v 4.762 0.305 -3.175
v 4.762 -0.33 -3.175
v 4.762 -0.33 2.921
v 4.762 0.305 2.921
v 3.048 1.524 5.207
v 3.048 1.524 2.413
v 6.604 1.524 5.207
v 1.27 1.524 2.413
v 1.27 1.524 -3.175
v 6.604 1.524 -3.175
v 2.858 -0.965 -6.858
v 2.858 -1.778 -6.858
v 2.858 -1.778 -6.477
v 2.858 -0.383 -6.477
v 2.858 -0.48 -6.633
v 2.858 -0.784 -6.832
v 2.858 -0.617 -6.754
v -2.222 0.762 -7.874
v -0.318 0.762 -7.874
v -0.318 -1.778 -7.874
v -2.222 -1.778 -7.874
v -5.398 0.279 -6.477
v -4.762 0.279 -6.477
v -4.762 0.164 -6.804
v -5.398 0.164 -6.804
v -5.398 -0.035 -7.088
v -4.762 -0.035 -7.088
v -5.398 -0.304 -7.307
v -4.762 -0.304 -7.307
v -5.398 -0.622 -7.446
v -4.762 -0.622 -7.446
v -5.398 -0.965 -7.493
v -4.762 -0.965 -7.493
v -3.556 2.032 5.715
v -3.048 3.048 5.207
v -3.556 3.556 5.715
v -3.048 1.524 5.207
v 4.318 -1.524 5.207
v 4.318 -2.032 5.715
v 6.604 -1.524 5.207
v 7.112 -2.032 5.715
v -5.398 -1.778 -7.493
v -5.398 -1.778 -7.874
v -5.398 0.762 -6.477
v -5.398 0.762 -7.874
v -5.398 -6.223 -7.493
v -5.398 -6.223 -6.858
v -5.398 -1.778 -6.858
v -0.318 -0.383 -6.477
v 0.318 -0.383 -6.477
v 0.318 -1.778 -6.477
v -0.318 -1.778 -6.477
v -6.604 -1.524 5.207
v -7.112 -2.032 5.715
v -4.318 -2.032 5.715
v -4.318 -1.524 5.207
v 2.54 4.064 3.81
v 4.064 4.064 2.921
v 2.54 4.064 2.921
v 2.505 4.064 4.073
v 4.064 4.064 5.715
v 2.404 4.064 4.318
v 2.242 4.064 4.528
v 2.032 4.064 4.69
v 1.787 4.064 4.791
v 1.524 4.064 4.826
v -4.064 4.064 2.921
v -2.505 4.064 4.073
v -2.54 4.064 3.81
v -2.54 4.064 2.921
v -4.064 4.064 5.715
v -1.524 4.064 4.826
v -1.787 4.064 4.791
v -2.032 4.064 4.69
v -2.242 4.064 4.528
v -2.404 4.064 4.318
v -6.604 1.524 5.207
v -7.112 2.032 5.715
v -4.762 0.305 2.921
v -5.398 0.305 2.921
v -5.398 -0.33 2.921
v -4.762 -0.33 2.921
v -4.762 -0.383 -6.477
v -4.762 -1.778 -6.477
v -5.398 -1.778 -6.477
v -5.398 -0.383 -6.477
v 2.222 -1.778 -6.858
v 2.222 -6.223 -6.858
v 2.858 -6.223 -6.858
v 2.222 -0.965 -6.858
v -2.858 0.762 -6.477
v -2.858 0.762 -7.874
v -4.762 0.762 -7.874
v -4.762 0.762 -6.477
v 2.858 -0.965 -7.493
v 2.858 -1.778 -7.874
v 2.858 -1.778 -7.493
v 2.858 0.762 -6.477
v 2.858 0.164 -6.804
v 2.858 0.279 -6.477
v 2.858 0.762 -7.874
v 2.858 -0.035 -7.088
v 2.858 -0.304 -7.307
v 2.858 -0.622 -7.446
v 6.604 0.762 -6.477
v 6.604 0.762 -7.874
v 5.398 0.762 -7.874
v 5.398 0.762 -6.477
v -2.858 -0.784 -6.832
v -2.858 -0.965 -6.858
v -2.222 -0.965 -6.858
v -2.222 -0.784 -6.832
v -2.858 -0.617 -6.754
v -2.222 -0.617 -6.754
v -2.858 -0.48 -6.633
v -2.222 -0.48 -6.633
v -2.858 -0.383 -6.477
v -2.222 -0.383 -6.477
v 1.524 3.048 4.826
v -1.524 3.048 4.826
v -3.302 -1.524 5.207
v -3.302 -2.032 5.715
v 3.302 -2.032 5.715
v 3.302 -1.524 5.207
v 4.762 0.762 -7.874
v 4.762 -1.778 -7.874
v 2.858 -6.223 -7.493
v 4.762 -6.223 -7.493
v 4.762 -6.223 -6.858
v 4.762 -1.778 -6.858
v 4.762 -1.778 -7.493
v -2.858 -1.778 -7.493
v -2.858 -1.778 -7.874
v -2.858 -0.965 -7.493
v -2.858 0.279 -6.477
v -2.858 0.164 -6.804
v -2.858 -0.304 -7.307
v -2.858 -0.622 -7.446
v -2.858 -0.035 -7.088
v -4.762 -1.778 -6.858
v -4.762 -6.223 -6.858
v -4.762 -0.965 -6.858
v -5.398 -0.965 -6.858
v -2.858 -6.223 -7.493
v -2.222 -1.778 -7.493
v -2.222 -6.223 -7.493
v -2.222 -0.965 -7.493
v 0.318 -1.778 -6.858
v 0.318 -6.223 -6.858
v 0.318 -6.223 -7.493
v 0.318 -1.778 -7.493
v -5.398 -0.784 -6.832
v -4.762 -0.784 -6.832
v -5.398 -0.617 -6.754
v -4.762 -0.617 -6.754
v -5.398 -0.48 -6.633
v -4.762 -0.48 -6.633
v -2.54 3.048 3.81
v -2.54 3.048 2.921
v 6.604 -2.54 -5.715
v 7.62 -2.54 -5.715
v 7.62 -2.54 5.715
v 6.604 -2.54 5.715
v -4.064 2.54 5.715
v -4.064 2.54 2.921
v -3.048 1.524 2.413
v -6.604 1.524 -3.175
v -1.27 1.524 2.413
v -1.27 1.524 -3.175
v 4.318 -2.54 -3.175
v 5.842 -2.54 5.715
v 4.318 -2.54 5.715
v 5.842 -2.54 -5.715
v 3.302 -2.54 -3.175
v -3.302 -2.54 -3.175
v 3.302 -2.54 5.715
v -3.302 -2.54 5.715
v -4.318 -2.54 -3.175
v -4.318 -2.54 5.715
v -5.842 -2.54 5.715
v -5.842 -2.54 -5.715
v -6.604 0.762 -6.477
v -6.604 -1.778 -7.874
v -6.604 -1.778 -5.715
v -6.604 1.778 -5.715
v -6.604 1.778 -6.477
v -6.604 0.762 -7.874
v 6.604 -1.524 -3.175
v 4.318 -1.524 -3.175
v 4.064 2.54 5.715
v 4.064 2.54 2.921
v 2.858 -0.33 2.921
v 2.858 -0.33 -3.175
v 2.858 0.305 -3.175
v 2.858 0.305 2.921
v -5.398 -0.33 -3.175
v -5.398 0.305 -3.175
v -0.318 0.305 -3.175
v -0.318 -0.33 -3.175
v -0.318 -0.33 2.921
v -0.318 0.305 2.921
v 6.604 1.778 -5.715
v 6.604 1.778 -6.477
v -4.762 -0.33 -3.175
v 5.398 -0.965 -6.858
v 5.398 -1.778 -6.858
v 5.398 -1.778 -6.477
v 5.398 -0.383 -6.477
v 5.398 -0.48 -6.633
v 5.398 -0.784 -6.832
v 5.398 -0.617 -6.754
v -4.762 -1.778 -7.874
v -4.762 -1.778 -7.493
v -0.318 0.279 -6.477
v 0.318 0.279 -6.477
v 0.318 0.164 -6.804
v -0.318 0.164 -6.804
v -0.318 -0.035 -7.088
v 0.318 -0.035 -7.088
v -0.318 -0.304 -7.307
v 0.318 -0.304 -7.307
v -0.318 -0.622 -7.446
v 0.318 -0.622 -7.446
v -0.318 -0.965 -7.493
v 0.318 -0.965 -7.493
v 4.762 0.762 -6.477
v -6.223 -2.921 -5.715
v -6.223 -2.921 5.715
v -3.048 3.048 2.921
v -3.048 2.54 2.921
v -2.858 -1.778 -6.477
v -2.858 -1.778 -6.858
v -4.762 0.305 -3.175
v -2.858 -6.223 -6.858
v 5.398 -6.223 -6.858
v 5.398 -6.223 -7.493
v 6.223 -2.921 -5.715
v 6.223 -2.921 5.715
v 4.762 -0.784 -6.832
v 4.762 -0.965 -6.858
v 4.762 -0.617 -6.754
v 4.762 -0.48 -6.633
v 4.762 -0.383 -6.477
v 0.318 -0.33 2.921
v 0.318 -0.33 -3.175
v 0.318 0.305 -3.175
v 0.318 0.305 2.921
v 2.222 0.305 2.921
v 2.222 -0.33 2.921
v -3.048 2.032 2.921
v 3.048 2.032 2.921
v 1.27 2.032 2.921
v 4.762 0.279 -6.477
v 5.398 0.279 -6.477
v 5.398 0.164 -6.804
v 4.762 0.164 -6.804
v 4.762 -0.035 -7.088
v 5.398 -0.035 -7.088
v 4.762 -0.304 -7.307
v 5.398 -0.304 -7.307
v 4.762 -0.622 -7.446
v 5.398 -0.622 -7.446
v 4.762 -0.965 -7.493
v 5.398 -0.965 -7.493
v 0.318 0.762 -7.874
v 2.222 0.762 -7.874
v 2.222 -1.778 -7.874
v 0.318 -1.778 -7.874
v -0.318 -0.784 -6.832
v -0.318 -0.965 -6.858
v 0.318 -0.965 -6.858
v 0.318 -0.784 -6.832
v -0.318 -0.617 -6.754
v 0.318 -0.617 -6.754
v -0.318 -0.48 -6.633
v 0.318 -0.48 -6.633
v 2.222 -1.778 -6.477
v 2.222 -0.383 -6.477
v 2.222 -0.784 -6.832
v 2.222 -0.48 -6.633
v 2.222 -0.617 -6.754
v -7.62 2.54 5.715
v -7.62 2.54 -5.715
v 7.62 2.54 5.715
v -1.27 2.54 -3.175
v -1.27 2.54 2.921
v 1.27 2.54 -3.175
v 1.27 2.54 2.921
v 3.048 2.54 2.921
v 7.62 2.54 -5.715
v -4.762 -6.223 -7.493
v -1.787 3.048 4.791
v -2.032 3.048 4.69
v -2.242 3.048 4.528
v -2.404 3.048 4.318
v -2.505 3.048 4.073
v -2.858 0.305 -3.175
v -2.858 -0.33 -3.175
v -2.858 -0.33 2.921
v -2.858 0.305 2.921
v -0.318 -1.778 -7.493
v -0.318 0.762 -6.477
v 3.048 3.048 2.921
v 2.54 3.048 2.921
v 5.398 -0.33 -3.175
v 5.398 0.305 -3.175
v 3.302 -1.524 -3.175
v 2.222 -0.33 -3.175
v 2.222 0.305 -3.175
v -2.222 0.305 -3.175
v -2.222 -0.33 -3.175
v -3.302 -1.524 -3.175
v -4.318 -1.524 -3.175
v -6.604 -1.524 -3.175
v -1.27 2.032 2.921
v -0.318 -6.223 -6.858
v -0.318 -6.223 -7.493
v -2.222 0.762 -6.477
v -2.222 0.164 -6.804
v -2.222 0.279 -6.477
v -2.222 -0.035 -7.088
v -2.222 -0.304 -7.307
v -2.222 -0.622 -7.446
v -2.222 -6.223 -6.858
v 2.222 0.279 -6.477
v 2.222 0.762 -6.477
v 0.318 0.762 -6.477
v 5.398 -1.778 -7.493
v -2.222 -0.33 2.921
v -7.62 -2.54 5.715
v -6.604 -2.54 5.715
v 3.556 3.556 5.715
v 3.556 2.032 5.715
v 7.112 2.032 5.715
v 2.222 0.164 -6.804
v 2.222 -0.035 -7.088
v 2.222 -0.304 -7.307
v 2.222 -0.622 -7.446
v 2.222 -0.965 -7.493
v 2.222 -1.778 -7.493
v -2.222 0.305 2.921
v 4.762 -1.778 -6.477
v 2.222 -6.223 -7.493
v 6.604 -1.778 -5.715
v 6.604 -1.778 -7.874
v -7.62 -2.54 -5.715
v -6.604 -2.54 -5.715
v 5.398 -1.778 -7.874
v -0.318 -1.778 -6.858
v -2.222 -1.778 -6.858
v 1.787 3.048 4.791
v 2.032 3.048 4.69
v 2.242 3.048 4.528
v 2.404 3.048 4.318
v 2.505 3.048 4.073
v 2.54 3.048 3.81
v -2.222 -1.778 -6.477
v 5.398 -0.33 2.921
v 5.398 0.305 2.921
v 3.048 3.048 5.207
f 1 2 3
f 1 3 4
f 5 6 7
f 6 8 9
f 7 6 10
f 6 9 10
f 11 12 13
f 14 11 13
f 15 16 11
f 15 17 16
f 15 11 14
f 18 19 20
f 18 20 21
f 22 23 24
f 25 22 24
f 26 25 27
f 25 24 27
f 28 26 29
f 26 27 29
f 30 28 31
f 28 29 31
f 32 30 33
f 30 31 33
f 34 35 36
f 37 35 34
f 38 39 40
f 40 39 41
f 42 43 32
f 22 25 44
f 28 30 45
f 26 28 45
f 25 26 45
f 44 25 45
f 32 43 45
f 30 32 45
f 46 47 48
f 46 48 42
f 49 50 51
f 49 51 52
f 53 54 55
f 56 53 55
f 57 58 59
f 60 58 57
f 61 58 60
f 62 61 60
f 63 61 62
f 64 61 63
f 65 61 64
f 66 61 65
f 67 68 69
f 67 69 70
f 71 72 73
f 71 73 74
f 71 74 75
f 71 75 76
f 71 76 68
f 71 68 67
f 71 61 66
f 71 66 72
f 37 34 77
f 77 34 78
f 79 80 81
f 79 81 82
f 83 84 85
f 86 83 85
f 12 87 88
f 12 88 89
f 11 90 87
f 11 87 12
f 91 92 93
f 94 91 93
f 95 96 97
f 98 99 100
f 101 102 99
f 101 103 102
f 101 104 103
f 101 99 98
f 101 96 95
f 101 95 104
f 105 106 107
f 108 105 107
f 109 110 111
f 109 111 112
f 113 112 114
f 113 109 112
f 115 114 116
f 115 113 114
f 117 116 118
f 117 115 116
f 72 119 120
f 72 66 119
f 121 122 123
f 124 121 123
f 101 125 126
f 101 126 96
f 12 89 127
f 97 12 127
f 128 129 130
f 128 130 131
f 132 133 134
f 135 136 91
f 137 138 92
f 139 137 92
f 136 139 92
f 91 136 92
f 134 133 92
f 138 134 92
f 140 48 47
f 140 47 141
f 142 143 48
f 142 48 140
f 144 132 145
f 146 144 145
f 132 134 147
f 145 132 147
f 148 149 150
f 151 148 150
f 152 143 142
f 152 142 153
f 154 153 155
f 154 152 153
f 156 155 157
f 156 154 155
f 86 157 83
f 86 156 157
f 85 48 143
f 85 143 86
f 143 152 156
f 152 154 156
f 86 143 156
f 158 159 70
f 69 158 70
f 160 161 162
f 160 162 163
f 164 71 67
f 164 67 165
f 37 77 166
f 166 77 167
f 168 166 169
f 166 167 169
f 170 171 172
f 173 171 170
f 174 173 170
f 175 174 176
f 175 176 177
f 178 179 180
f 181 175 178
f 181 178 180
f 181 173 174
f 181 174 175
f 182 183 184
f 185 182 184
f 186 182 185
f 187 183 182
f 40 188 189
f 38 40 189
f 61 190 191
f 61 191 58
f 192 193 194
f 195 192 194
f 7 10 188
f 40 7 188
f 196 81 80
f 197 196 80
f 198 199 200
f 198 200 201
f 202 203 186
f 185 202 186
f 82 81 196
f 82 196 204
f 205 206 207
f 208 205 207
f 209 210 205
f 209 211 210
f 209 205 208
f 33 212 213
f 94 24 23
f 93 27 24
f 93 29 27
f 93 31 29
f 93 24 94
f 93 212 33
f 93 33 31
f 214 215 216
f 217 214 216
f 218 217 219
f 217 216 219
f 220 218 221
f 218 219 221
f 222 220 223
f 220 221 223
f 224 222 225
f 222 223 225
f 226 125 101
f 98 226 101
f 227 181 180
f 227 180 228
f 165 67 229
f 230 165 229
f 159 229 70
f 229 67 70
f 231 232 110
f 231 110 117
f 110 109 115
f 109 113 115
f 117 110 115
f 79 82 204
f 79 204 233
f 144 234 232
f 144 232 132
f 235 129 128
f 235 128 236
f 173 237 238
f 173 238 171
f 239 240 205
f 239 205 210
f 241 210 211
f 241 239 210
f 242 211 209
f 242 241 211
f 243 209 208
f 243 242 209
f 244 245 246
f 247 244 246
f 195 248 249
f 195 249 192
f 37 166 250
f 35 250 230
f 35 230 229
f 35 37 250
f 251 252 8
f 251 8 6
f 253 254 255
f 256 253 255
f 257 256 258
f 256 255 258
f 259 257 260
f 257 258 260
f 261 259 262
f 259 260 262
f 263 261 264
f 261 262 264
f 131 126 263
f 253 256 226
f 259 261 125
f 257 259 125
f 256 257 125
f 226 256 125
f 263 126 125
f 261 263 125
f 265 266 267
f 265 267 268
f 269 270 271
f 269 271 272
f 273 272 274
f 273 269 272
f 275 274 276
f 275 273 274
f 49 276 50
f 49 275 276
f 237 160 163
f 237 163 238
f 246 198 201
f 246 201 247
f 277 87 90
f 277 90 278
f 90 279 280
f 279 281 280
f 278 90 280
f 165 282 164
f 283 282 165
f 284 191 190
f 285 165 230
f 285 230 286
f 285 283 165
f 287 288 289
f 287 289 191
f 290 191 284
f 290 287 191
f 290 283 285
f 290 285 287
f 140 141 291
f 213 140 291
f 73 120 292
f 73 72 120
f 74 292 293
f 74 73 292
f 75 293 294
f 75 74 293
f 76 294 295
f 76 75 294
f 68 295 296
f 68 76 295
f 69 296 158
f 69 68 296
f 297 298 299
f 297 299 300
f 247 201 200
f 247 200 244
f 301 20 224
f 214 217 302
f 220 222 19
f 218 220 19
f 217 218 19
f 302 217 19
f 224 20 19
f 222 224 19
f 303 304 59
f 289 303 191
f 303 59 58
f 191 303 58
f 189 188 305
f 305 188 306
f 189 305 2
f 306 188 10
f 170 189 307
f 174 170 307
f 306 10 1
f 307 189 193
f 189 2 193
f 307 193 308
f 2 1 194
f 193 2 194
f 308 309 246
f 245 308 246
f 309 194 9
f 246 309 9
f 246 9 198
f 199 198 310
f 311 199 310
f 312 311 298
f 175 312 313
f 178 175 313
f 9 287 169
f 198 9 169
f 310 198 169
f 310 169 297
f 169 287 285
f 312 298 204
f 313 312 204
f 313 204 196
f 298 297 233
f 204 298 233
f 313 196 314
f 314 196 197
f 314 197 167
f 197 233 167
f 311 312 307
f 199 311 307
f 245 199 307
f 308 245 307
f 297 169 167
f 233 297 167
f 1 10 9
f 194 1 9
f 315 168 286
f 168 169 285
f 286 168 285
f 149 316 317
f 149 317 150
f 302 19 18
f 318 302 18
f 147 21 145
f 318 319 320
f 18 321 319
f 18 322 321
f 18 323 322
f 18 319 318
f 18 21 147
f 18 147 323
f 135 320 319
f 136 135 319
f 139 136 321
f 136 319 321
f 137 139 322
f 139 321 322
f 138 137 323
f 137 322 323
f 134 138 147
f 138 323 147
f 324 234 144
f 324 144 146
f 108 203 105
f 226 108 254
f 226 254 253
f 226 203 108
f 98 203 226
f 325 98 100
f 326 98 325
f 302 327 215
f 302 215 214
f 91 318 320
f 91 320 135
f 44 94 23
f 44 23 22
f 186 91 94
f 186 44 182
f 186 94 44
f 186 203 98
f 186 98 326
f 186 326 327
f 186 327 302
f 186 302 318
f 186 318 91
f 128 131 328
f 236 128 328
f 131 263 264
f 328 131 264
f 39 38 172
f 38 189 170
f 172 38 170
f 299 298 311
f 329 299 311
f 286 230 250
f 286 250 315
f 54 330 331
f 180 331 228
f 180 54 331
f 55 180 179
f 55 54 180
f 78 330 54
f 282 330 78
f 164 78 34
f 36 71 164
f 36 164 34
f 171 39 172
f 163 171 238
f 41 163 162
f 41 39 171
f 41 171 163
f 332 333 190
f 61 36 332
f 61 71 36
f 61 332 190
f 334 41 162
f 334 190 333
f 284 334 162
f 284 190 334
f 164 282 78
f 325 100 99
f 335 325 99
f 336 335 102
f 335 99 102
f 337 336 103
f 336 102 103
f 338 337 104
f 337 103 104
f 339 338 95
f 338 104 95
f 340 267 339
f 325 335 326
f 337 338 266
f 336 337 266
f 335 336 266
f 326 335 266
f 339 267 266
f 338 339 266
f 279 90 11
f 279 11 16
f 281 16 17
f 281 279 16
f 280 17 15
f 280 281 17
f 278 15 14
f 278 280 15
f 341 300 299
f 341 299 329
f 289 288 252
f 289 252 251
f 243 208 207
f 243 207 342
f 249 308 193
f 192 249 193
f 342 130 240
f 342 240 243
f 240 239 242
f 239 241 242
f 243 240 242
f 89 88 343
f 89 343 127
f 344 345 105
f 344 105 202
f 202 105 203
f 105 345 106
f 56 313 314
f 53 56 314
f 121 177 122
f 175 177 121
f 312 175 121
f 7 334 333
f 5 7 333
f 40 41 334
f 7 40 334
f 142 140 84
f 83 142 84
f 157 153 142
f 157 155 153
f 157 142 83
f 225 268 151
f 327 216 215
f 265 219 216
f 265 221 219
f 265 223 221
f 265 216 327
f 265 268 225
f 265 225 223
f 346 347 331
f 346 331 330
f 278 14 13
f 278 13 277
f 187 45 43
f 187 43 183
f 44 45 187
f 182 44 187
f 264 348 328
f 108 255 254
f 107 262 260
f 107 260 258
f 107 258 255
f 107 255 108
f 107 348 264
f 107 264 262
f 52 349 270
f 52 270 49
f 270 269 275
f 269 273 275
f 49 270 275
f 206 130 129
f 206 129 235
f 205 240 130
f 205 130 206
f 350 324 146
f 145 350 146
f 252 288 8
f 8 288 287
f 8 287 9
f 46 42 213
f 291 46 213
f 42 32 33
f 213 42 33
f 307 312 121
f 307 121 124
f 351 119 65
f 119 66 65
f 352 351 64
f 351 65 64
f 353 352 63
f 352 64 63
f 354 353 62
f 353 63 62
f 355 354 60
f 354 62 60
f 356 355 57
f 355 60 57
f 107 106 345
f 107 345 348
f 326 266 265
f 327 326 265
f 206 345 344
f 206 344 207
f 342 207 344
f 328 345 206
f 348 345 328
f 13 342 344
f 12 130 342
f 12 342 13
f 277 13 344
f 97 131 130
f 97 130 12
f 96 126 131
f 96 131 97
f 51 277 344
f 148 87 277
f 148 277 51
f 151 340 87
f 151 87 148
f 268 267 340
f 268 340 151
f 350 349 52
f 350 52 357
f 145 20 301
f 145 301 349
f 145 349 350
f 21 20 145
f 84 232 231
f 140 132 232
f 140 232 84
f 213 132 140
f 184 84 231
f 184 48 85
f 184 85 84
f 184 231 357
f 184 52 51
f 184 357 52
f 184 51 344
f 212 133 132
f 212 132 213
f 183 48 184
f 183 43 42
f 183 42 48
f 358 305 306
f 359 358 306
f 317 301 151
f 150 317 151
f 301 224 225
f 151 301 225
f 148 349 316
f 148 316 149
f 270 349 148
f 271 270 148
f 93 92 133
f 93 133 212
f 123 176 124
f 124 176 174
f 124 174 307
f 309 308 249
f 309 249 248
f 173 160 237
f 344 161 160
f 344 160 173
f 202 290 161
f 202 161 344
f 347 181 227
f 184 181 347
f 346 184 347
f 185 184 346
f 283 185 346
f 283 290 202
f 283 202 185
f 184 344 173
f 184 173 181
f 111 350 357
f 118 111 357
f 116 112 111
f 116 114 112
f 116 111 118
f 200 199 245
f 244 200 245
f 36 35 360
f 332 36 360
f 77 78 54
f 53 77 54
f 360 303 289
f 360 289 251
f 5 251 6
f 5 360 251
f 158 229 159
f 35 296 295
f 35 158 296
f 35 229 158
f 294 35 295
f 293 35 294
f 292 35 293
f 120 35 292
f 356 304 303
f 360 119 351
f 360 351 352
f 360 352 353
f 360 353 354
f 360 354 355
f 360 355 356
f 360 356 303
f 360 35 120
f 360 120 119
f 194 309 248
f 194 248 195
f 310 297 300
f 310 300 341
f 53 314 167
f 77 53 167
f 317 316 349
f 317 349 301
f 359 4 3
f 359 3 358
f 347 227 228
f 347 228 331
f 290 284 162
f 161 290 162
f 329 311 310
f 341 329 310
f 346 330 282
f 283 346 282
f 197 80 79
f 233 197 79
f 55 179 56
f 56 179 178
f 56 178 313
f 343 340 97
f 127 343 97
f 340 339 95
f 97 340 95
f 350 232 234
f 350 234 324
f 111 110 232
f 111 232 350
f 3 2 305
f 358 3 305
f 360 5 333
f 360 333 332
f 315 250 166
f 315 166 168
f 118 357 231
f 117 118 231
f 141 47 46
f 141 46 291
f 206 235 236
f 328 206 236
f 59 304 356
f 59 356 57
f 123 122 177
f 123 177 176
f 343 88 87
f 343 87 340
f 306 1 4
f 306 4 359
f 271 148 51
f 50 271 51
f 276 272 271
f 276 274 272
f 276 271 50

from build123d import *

# Parameters (mm, degrees)
SKETCH1_W            = 13.208
SKETCH1_H            = 3.556
BOSS_EXTRUDE1_DEPTH  = 0.762
SKETCH2_W            = 0.635
SKETCH2_H            = 0.662353677
BOSS_EXTRUDE2_DEPTH  = 1.016
SKETCH3_W            = 0.635
SKETCH3_H            = 0.662353677
BOSS_EXTRUDE3_DEPTH  = 1.016
SKETCH4_W            = 0.635
SKETCH4_H            = 0.662353677
BOSS_EXTRUDE4_DEPTH  = 1.016
SKETCH5_W            = 0.635
SKETCH5_H            = 0.662353677
BOSS_EXTRUDE5_DEPTH  = 1.016
SKETCH6_W            = 0.635
SKETCH6_H            = 0.662353677
BOSS_EXTRUDE6_DEPTH  = 1.016
SKETCH7_W            = 0.635
SKETCH7_H            = 0.635
BOSS_EXTRUDE7_DEPTH  = 5.839787113
SKETCH8_W            = 0.635
SKETCH8_H            = 0.635
BOSS_EXTRUDE8_DEPTH  = 5.839787113
SKETCH9_W            = 0.635
SKETCH9_H            = 0.635
BOSS_EXTRUDE9_DEPTH  = 5.839787113
SKETCH10_W           = 0.635
SKETCH10_H           = 0.635
BOSS_EXTRUDE10_DEPTH = 5.839787113
SKETCH11_W           = 0.635
SKETCH11_H           = 0.635
BOSS_EXTRUDE11_DEPTH = 5.839787113
BOSS_EXTRUDE12_DEPTH = 11.43
CUT_EXTRUDE1_REACH   = 15.26
SKETCH14_W           = 1.778
SKETCH14_H           = 1.016
CUT_EXTRUDE2_DEPTH   = 2.793999999
SKETCH15_W           = 1.778
SKETCH15_H           = 1.016
CUT_EXTRUDE3_DEPTH   = 2.794
BOSS_EXTRUDE13_DEPTH = 2.794
SKETCH17_W           = 6.604
SKETCH17_H           = 1.016
BOSS_EXTRUDE14_DEPTH = 8.89
SKETCH18_W           = 5.08
SKETCH18_H           = 1.016
CUT_EXTRUDE4_DEPTH   = 1.905
CHAMFER1_SIZE        = 0.508
CHAMFER2_SIZE        = 0.508
CHAMFER3_SIZE        = 0.508
DRAFT1_ANGLE         = 45
CHAMFER4_SIZE        = 0.508
SKETCH19_W           = 0.635
SKETCH19_H           = 0.635
BOSS_EXTRUDE15_DEPTH = 6.096
SKETCH20_W           = 0.635
SKETCH20_H           = 0.635
BOSS_EXTRUDE16_DEPTH = 6.096
SKETCH21_W           = 0.635
SKETCH21_H           = 0.635
BOSS_EXTRUDE17_DEPTH = 6.096
SKETCH22_W           = 0.635
SKETCH22_H           = 0.635
BOSS_EXTRUDE18_DEPTH = 6.096
SKETCH23_W           = 0.635
SKETCH23_H           = 0.635
BOSS_EXTRUDE19_DEPTH = 6.096
FILLET1_R            = 0.635
FILLET2_R            = 0.635
FILLET3_R            = 0.635
FILLET4_R            = 0.635
FILLET5_R            = 0.635
FILLET6_R            = 1.27
FILLET7_R            = 1.27
FILLET8_R            = 1.27
FILLET9_R            = 1.27
FILLET10_R           = 1.27
SKETCH24_W           = 1.905
SKETCH24_H           = 2.54
BOSS_EXTRUDE20_DEPTH = 1.397
SKETCH25_W           = 1.905
SKETCH25_H           = 2.54
BOSS_EXTRUDE21_DEPTH = 1.397
SKETCH26_W           = 1.905
SKETCH26_H           = 2.54
BOSS_EXTRUDE22_DEPTH = 1.397
SKETCH27_W           = 1.2065
SKETCH27_H           = 2.54
BOSS_EXTRUDE23_DEPTH = 1.397
SKETCH28_W           = 1.905
SKETCH28_H           = 2.54
BOSS_EXTRUDE24_DEPTH = 1.397
SKETCH29_W           = 1.2065
SKETCH29_H           = 2.54
BOSS_EXTRUDE25_DEPTH = 1.397
FILLET11_R           = 1.016
FILLET12_R           = 1.016


with BuildPart() as part:
    # Sketch1 → Boss-Extrude1 (new body)
    with BuildSketch(Plane(origin=(0, 0, -6.477), x_dir=(-1, 0, 0), z_dir=(0, 0, -1))):
        Rectangle(SKETCH1_W, SKETCH1_H)
    extrude(amount=-BOSS_EXTRUDE1_DEPTH)

    # Sketch2 → Boss-Extrude2 (add)
    with BuildSketch(Plane(origin=(0, 0, -6.477), x_dir=(-1, 0, 0), z_dir=(0, 0, -1))):
        with Locations((5.08, -0.052036048)):
            Rectangle(SKETCH2_W, SKETCH2_H)
    extrude(amount=BOSS_EXTRUDE2_DEPTH)

    # Sketch3 → Boss-Extrude3 (add)
    with BuildSketch(Plane(origin=(0, 0, -6.477), x_dir=(-1, 0, 0), z_dir=(0, 0, -1))):
        with Locations((2.54, -0.052036048)):
            Rectangle(SKETCH3_W, SKETCH3_H)
    extrude(amount=BOSS_EXTRUDE3_DEPTH)

    # Sketch4 → Boss-Extrude4 (add)
    with BuildSketch(Plane(origin=(0, 0, -6.477), x_dir=(-1, 0, 0), z_dir=(0, 0, -1))):
        with Locations((0, -0.052036048)):
            Rectangle(SKETCH4_W, SKETCH4_H)
    extrude(amount=BOSS_EXTRUDE4_DEPTH)

    # Sketch5 → Boss-Extrude5 (add)
    with BuildSketch(Plane(origin=(0, 0, -6.477), x_dir=(-1, 0, 0), z_dir=(0, 0, -1))):
        with Locations((-2.54, -0.052036048)):
            Rectangle(SKETCH5_W, SKETCH5_H)
    extrude(amount=BOSS_EXTRUDE5_DEPTH)

    # Sketch6 → Boss-Extrude6 (add)
    with BuildSketch(Plane(origin=(0, 0, -6.477), x_dir=(-1, 0, 0), z_dir=(0, 0, -1))):
        with Locations((-5.08, -0.052036048)):
            Rectangle(SKETCH6_W, SKETCH6_H)
    extrude(amount=BOSS_EXTRUDE6_DEPTH)

    # Sketch7 → Boss-Extrude7 (add)
    with BuildSketch(Plane.XZ.offset(0.383212887)):
        with Locations((5.08, -7.1755)):
            Rectangle(SKETCH7_W, SKETCH7_H)
    extrude(amount=BOSS_EXTRUDE7_DEPTH)

    # Sketch8 → Boss-Extrude8 (add)
    with BuildSketch(Plane.XZ.offset(0.383212887)):
        with Locations((2.54, -7.1755)):
            Rectangle(SKETCH8_W, SKETCH8_H)
    extrude(amount=BOSS_EXTRUDE8_DEPTH)

    # Sketch9 → Boss-Extrude9 (add)
    with BuildSketch(Plane.XZ.offset(0.383212887)):
        with Locations((0, -7.1755)):
            Rectangle(SKETCH9_W, SKETCH9_H)
    extrude(amount=BOSS_EXTRUDE9_DEPTH)

    # Sketch10 → Boss-Extrude10 (add)
    with BuildSketch(Plane.XZ.offset(0.383212887)):
        with Locations((-2.54, -7.1755)):
            Rectangle(SKETCH10_W, SKETCH10_H)
    extrude(amount=BOSS_EXTRUDE10_DEPTH)

    # Sketch11 → Boss-Extrude11 (add)
    with BuildSketch(Plane.XZ.offset(0.383212887)):
        with Locations((-5.08, -7.1755)):
            Rectangle(SKETCH11_W, SKETCH11_H)
    extrude(amount=BOSS_EXTRUDE11_DEPTH)

    # Sketch12 → Boss-Extrude12 (add)
    with BuildSketch(Plane(origin=(0, 0, -5.715), x_dir=(-1, 0, 0), z_dir=(0, 0, -1))):
        Polygon((7.62, 2.54), (-7.62, 2.54), (-7.62, -2.54), (-6.604, -2.54), (-5.842, -3.302), (-5.842, -2.54), (5.842, -2.54), (5.842, -3.302), (6.604, -2.54), (7.62, -2.54), align=None)
    extrude(amount=-BOSS_EXTRUDE12_DEPTH)

    # Sketch13 → Cut-Extrude1 (cut, up to next)
    with BuildSketch(Plane(origin=(0, 0, -3.175), x_dir=(-1, 0, 0), z_dir=(0, 0, -1)), mode=Mode.PRIVATE) as cut_extrude1_sk1:
        Polygon((-4.318, -2.54), (4.318, -2.54), (4.318, -1.524), (6.604, -1.524), (6.604, 1.524), (1.27, 1.524), (1.27, 2.54), (-1.27, 2.54), (-1.27, 1.524), (-6.604, 1.524), (-6.604, -1.524), (-4.318, -1.524), align=None)
    cut_extrude1_tool1 = extrude(cut_extrude1_sk1.sketch, amount=-CUT_EXTRUDE1_REACH, mode=Mode.PRIVATE) & part.part
    add(cut_extrude1_tool1.solids().sort_by_distance((0, -0.24384, -3.175))[0], mode=Mode.SUBTRACT)

    # Sketch14 → Cut-Extrude2 (cut)
    with BuildSketch(Plane.XY.offset(5.715)):
        with Locations((2.159, 2.032)):
            Rectangle(SKETCH14_W, SKETCH14_H)
    extrude(amount=-CUT_EXTRUDE2_DEPTH, mode=Mode.SUBTRACT)

    # Sketch15 → Cut-Extrude3 (cut)
    with BuildSketch(Plane.XY.offset(5.715)):
        with Locations((-2.159, 2.032)):
            Rectangle(SKETCH15_W, SKETCH15_H)
    extrude(amount=-CUT_EXTRUDE3_DEPTH, mode=Mode.SUBTRACT)

    # Sketch16 → Boss-Extrude13 (add)
    with BuildSketch(Plane.XY.offset(5.715)):
        Polygon((-3.048, 3.048), (3.048, 3.048), (3.048, 2.54), (4.064, 2.54), (4.064, 4.064), (-4.064, 4.064), (-4.064, 2.54), (-3.048, 2.54), align=None)
    extrude(amount=-BOSS_EXTRUDE13_DEPTH)

    # Sketch17 → Boss-Extrude14 (add)
    with BuildSketch(Plane.XY.offset(-3.175)):
        with Locations((0, -2.032)):
            Rectangle(SKETCH17_W, SKETCH17_H)
    extrude(amount=BOSS_EXTRUDE14_DEPTH)

    # Sketch18 → Cut-Extrude4 (cut)
    with BuildSketch(Plane(origin=(0, 0, 2.921), x_dir=(-1, 0, 0), z_dir=(0, 0, -1))):
        with Locations((0, 3.556)):
            Rectangle(SKETCH18_W, SKETCH18_H)
    extrude(amount=-CUT_EXTRUDE4_DEPTH, mode=Mode.SUBTRACT)

    # Chamfer1
    chamfer1_edges = [part.edges().sort_by_distance(p)[0] for p in [
        (2.159, 1.524, 2.921000001),
    ]]
    chamfer(chamfer1_edges, length=CHAMFER1_SIZE)

    # Chamfer2
    chamfer2_edges = [part.edges().sort_by_distance(p)[0] for p in [
        (-2.159, 1.524, 2.921),
    ]]
    chamfer(chamfer2_edges, length=CHAMFER2_SIZE)

    # Chamfer3
    chamfer3_edges = [part.edges().sort_by_distance(p)[0] for p in [
        (0, -1.524, 5.715),
    ]]
    chamfer(chamfer3_edges, length=CHAMFER3_SIZE)

    # Draft1
    draft1_faces = [part.faces().sort_by_distance(p)[0] for p in [
        (5.842, -2.921, 0),
        (-5.842, -2.921, 0),
    ]]
    draft(draft1_faces, Plane(origin=(5.842, -2.54, 5.715), x_dir=(0, 0, -1), z_dir=(0, -1, 0)), DRAFT1_ANGLE)

    # Chamfer4
    chamfer4_edges = [part.edges().sort_by_distance(p)[0] for p in [
        (5.461, -1.524, 5.715),
        (6.604, 0, 5.715),
        (4.826, 1.524, 5.715),
        (-6.604, 0, 5.715),
        (-5.461, -1.524, 5.715),
        (3.048, 2.032, 5.715),
        (-4.826, 1.524, 5.715),
        (-3.048, 2.032, 5.715),
        (0, 3.048, 5.715),
    ]]
    chamfer(chamfer4_edges, length=CHAMFER4_SIZE)

    # Sketch19 → Boss-Extrude15 (add)
    with BuildSketch(Plane.XY.offset(-3.175)):
        with Locations((5.08, -0.0127)):
            Rectangle(SKETCH19_W, SKETCH19_H)
    extrude(amount=BOSS_EXTRUDE15_DEPTH)

    # Sketch20 → Boss-Extrude16 (add)
    with BuildSketch(Plane.XY.offset(-3.175)):
        with Locations((2.54, -0.0127)):
            Rectangle(SKETCH20_W, SKETCH20_H)
    extrude(amount=BOSS_EXTRUDE16_DEPTH)

    # Sketch21 → Boss-Extrude17 (add)
    with BuildSketch(Plane.XY.offset(-3.175)):
        with Locations((0, -0.0127)):
            Rectangle(SKETCH21_W, SKETCH21_H)
    extrude(amount=BOSS_EXTRUDE17_DEPTH)

    # Sketch22 → Boss-Extrude18 (add)
    with BuildSketch(Plane.XY.offset(-3.175)):
        with Locations((-2.54, -0.0127)):
            Rectangle(SKETCH22_W, SKETCH22_H)
    extrude(amount=BOSS_EXTRUDE18_DEPTH)

    # Sketch23 → Boss-Extrude19 (add)
    with BuildSketch(Plane.XY.offset(2.921)):
        with Locations((-5.08, -0.0127)):
            Rectangle(SKETCH23_W, SKETCH23_H)
    extrude(amount=-BOSS_EXTRUDE19_DEPTH)

    # Fillet1
    # the kernel refuses this fillet: 0.635 mm, written as the material it adds along each edge
    with BuildSketch(Plane(origin=(-5.3975, -0.383212887, -6.858), x_dir=(0, 0, 1), z_dir=(1, 0, 0))) as fillet1_piece_1:
        with BuildLine():
            CenterArc((0.635, 0.581987113), FILLET1_R, 180, 66.421821522)
            Line((0, 0.581987113), (-0.0127, 0.581987113))
            Line((-0.0127, 0.581987113), (-0.0127, 0))
            Line((-0.0127, 0), (0, -0.0127))
            ThreePointArc((0, -0.0127), (0.1905, -0.0127), (0.37592, -0.011639742))
            Line((0.37592, -0.011639742), (0.381, 0))
        make_face()
    extrude(amount=0.635)

    # Fillet2
    # the kernel refuses this fillet: 0.635 mm, written as the material it adds along each edge
    with BuildSketch(Plane(origin=(-2.8575, -0.383212887, -6.858), x_dir=(0, 0, 1), z_dir=(1, 0, 0))) as fillet2_piece_1:
        with BuildLine():
            CenterArc((0.635, 0.581987113), FILLET2_R, 180, 66.421821522)
            Line((0, 0.581987113), (-0.0127, 0.581987113))
            Line((-0.0127, 0.581987113), (-0.0127, 0))
            Line((-0.0127, 0), (0, -0.0127))
            ThreePointArc((0, -0.0127), (0.1905, -0.0127), (0.37592, -0.011639742))
            Line((0.37592, -0.011639742), (0.381, 0))
        make_face()
    extrude(amount=0.635)

    # Fillet3
    # the kernel refuses this fillet: 0.635 mm, written as the material it adds along each edge
    with BuildSketch(Plane(origin=(-0.3175, -0.383212887, -6.858), x_dir=(0, 0, 1), z_dir=(1, 0, 0))) as fillet3_piece_1:
        with BuildLine():
            CenterArc((0.635, 0.581987113), FILLET3_R, 180, 66.421821522)
            Line((0, 0.581987113), (-0.0127, 0.581987113))
            Line((-0.0127, 0.581987113), (-0.0127, 0))
            Line((-0.0127, 0), (0, -0.0127))
            ThreePointArc((0, -0.0127), (0.1905, -0.0127), (0.37592, -0.011639742))
            Line((0.37592, -0.011639742), (0.381, 0))
        make_face()
    extrude(amount=0.635)

    # Fillet4
    # the kernel refuses this fillet: 0.635 mm, written as the material it adds along each edge
    with BuildSketch(Plane(origin=(2.2225, -0.383212887, -6.858), x_dir=(0, 0, 1), z_dir=(1, 0, 0))) as fillet4_piece_1:
        with BuildLine():
            CenterArc((0.635, 0.581987113), FILLET4_R, 180, 66.421821522)
            Line((0, 0.581987113), (-0.0127, 0.581987113))
            Line((-0.0127, 0.581987113), (-0.0127, 0))
            Line((-0.0127, 0), (0, -0.0127))
            ThreePointArc((0, -0.0127), (0.1905, -0.0127), (0.37592, -0.011639742))
            Line((0.37592, -0.011639742), (0.381, 0))
        make_face()
    extrude(amount=0.635)

    # Fillet5
    # the kernel refuses this fillet: 0.635 mm, written as the material it adds along each edge
    with BuildSketch(Plane(origin=(4.7625, -0.383212887, -6.858), x_dir=(0, 0, 1), z_dir=(1, 0, 0))) as fillet5_piece_1:
        with BuildLine():
            CenterArc((0.635, 0.581987113), FILLET5_R, 180, 66.421821522)
            Line((0, 0.581987113), (-0.0127, 0.581987113))
            Line((-0.0127, 0.581987113), (-0.0127, 0))
            Line((-0.0127, 0), (0, -0.0127))
            ThreePointArc((0, -0.0127), (0.1905, -0.0127), (0.37592, -0.011639742))
            Line((0.37592, -0.011639742), (0.381, 0))
        make_face()
    extrude(amount=0.635)

    # Fillet6
    # the kernel refuses this fillet: 1.27 mm, written as the material it takes off along each edge
    with BuildSketch(Plane(origin=(-4.7625, 0.27914079, -7.493), x_dir=(0, -1.5751835531463075e-12, 1.0), z_dir=(-1, 0, 0))) as fillet6_piece_1:
        with BuildLine():
            CenterArc((1.27, -1.244340789), FILLET6_R, 101.536959033, 78.463040967)
            Line((0, -1.244340789), (0, 0))
            Line((0, 0), (1.016, 0))
        make_face()
    extrude(amount=3.745851973, mode=Mode.SUBTRACT)

    # Fillet7
    # the kernel refuses this fillet: 1.27 mm, written as the material it takes off along each edge
    with BuildSketch(Plane(origin=(-2.2225, 0.27914079, -7.493), x_dir=(0, -1.5751835531463075e-12, 1.0), z_dir=(-1, 0, 0))) as fillet7_piece_1:
        with BuildLine():
            CenterArc((1.27, -1.244340789), FILLET7_R, 101.536959033, 78.463040967)
            Line((0, -1.244340789), (0, 0))
            Line((0, 0), (1.016, 0))
        make_face()
    extrude(amount=3.745851973, mode=Mode.SUBTRACT)

    # Fillet8
    # the kernel refuses this fillet: 1.27 mm, written as the material it takes off along each edge
    with BuildSketch(Plane(origin=(0.3175, 0.27914079, -7.493), x_dir=(0, -1.5751835531463075e-12, 1.0), z_dir=(-1, 0, 0))) as fillet8_piece_1:
        with BuildLine():
            CenterArc((1.27, -1.244340789), FILLET8_R, 101.536959033, 78.463040967)
            Line((0, -1.244340789), (0, 0))
            Line((0, 0), (1.016, 0))
        make_face()
    extrude(amount=3.745851974, mode=Mode.SUBTRACT)

    # Fillet9
    # the kernel refuses this fillet: 1.27 mm, written as the material it takes off along each edge
    with BuildSketch(Plane(origin=(2.8575, 0.27914079, -7.493), x_dir=(0, -1.5751835531463075e-12, 1.0), z_dir=(-1, 0, 0))) as fillet9_piece_1:
        with BuildLine():
            CenterArc((1.27, -1.244340789), FILLET9_R, 101.536959033, 78.463040967)
            Line((0, -1.244340789), (0, 0))
            Line((0, 0), (1.016, 0))
        make_face()
    extrude(amount=3.745851973, mode=Mode.SUBTRACT)

    # Fillet10
    # the kernel refuses this fillet: 1.27 mm, written as the material it takes off along each edge
    with BuildSketch(Plane(origin=(8.508351974, 0.27914079, -7.493), x_dir=(0, -1.5751835531463075e-12, 1.0), z_dir=(-1, 0, 0))) as fillet10_piece_1:
        with BuildLine():
            CenterArc((1.27, -1.244340789), FILLET10_R, 101.536959033, 78.463040967)
            Line((0, -1.244340789), (-0.0254, -1.244340789))
            Line((-0.0254, -1.244340789), (-0.0254, 0))
            Line((-0.0254, 0), (0, 0.0254))
            ThreePointArc((0, 0.0254), (0.508, 0.0254), (1.01092, 0.024886816))
            Line((1.01092, 0.024886816), (1.016, 0))
        make_face()
    extrude(amount=6.856703947, mode=Mode.SUBTRACT)

    # Sketch24 → Boss-Extrude20 (add)
    with BuildSketch(Plane(origin=(0, 0, -7.874), x_dir=(-1, 0, 0), z_dir=(0, 0, -1))):
        with Locations((1.27, -0.508)):
            Rectangle(SKETCH24_W, SKETCH24_H)
    extrude(amount=-BOSS_EXTRUDE20_DEPTH)

    # Sketch25 → Boss-Extrude21 (add)
    with BuildSketch(Plane(origin=(0, 0, -7.874), x_dir=(-1, 0, 0), z_dir=(0, 0, -1))):
        with Locations((-1.27, -0.508)):
            Rectangle(SKETCH25_W, SKETCH25_H)
    extrude(amount=-BOSS_EXTRUDE21_DEPTH)

    # Sketch26 → Boss-Extrude22 (add)
    with BuildSketch(Plane(origin=(0, 0, -7.874), x_dir=(-1, 0, 0), z_dir=(0, 0, -1))):
        with Locations((3.81, -0.508)):
            Rectangle(SKETCH26_W, SKETCH26_H)
    extrude(amount=-BOSS_EXTRUDE22_DEPTH)

    # Sketch27 → Boss-Extrude23 (add)
    with BuildSketch(Plane(origin=(0, 0, -7.874), x_dir=(-1, 0, 0), z_dir=(0, 0, -1))):
        with Locations((6.00075, -0.508)):
            Rectangle(SKETCH27_W, SKETCH27_H)
    extrude(amount=-BOSS_EXTRUDE23_DEPTH)

    # Sketch28 → Boss-Extrude24 (add)
    with BuildSketch(Plane(origin=(0, 0, -7.874), x_dir=(-1, 0, 0), z_dir=(0, 0, -1))):
        with Locations((-3.81, -0.508)):
            Rectangle(SKETCH28_W, SKETCH28_H)
    extrude(amount=-BOSS_EXTRUDE24_DEPTH)

    # Sketch29 → Boss-Extrude25 (add)
    with BuildSketch(Plane(origin=(0, 0, -7.874), x_dir=(-1, 0, 0), z_dir=(0, 0, -1))):
        with Locations((-6.00075, -0.508)):
            Rectangle(SKETCH29_W, SKETCH29_H)
    extrude(amount=-BOSS_EXTRUDE25_DEPTH)

    # Fillet11
    fillet11_edges = [part.edges().sort_by_distance(p)[0] for p in [
        (2.54, 3.556, 4.826),
    ]]
    fillet(fillet11_edges, radius=FILLET11_R)

    # Fillet12
    fillet12_edges = [part.edges().sort_by_distance(p)[0] for p in [
        (-2.54, 3.556, 4.826),
    ]]
    fillet(fillet12_edges, radius=FILLET12_R)


solid = part.part
